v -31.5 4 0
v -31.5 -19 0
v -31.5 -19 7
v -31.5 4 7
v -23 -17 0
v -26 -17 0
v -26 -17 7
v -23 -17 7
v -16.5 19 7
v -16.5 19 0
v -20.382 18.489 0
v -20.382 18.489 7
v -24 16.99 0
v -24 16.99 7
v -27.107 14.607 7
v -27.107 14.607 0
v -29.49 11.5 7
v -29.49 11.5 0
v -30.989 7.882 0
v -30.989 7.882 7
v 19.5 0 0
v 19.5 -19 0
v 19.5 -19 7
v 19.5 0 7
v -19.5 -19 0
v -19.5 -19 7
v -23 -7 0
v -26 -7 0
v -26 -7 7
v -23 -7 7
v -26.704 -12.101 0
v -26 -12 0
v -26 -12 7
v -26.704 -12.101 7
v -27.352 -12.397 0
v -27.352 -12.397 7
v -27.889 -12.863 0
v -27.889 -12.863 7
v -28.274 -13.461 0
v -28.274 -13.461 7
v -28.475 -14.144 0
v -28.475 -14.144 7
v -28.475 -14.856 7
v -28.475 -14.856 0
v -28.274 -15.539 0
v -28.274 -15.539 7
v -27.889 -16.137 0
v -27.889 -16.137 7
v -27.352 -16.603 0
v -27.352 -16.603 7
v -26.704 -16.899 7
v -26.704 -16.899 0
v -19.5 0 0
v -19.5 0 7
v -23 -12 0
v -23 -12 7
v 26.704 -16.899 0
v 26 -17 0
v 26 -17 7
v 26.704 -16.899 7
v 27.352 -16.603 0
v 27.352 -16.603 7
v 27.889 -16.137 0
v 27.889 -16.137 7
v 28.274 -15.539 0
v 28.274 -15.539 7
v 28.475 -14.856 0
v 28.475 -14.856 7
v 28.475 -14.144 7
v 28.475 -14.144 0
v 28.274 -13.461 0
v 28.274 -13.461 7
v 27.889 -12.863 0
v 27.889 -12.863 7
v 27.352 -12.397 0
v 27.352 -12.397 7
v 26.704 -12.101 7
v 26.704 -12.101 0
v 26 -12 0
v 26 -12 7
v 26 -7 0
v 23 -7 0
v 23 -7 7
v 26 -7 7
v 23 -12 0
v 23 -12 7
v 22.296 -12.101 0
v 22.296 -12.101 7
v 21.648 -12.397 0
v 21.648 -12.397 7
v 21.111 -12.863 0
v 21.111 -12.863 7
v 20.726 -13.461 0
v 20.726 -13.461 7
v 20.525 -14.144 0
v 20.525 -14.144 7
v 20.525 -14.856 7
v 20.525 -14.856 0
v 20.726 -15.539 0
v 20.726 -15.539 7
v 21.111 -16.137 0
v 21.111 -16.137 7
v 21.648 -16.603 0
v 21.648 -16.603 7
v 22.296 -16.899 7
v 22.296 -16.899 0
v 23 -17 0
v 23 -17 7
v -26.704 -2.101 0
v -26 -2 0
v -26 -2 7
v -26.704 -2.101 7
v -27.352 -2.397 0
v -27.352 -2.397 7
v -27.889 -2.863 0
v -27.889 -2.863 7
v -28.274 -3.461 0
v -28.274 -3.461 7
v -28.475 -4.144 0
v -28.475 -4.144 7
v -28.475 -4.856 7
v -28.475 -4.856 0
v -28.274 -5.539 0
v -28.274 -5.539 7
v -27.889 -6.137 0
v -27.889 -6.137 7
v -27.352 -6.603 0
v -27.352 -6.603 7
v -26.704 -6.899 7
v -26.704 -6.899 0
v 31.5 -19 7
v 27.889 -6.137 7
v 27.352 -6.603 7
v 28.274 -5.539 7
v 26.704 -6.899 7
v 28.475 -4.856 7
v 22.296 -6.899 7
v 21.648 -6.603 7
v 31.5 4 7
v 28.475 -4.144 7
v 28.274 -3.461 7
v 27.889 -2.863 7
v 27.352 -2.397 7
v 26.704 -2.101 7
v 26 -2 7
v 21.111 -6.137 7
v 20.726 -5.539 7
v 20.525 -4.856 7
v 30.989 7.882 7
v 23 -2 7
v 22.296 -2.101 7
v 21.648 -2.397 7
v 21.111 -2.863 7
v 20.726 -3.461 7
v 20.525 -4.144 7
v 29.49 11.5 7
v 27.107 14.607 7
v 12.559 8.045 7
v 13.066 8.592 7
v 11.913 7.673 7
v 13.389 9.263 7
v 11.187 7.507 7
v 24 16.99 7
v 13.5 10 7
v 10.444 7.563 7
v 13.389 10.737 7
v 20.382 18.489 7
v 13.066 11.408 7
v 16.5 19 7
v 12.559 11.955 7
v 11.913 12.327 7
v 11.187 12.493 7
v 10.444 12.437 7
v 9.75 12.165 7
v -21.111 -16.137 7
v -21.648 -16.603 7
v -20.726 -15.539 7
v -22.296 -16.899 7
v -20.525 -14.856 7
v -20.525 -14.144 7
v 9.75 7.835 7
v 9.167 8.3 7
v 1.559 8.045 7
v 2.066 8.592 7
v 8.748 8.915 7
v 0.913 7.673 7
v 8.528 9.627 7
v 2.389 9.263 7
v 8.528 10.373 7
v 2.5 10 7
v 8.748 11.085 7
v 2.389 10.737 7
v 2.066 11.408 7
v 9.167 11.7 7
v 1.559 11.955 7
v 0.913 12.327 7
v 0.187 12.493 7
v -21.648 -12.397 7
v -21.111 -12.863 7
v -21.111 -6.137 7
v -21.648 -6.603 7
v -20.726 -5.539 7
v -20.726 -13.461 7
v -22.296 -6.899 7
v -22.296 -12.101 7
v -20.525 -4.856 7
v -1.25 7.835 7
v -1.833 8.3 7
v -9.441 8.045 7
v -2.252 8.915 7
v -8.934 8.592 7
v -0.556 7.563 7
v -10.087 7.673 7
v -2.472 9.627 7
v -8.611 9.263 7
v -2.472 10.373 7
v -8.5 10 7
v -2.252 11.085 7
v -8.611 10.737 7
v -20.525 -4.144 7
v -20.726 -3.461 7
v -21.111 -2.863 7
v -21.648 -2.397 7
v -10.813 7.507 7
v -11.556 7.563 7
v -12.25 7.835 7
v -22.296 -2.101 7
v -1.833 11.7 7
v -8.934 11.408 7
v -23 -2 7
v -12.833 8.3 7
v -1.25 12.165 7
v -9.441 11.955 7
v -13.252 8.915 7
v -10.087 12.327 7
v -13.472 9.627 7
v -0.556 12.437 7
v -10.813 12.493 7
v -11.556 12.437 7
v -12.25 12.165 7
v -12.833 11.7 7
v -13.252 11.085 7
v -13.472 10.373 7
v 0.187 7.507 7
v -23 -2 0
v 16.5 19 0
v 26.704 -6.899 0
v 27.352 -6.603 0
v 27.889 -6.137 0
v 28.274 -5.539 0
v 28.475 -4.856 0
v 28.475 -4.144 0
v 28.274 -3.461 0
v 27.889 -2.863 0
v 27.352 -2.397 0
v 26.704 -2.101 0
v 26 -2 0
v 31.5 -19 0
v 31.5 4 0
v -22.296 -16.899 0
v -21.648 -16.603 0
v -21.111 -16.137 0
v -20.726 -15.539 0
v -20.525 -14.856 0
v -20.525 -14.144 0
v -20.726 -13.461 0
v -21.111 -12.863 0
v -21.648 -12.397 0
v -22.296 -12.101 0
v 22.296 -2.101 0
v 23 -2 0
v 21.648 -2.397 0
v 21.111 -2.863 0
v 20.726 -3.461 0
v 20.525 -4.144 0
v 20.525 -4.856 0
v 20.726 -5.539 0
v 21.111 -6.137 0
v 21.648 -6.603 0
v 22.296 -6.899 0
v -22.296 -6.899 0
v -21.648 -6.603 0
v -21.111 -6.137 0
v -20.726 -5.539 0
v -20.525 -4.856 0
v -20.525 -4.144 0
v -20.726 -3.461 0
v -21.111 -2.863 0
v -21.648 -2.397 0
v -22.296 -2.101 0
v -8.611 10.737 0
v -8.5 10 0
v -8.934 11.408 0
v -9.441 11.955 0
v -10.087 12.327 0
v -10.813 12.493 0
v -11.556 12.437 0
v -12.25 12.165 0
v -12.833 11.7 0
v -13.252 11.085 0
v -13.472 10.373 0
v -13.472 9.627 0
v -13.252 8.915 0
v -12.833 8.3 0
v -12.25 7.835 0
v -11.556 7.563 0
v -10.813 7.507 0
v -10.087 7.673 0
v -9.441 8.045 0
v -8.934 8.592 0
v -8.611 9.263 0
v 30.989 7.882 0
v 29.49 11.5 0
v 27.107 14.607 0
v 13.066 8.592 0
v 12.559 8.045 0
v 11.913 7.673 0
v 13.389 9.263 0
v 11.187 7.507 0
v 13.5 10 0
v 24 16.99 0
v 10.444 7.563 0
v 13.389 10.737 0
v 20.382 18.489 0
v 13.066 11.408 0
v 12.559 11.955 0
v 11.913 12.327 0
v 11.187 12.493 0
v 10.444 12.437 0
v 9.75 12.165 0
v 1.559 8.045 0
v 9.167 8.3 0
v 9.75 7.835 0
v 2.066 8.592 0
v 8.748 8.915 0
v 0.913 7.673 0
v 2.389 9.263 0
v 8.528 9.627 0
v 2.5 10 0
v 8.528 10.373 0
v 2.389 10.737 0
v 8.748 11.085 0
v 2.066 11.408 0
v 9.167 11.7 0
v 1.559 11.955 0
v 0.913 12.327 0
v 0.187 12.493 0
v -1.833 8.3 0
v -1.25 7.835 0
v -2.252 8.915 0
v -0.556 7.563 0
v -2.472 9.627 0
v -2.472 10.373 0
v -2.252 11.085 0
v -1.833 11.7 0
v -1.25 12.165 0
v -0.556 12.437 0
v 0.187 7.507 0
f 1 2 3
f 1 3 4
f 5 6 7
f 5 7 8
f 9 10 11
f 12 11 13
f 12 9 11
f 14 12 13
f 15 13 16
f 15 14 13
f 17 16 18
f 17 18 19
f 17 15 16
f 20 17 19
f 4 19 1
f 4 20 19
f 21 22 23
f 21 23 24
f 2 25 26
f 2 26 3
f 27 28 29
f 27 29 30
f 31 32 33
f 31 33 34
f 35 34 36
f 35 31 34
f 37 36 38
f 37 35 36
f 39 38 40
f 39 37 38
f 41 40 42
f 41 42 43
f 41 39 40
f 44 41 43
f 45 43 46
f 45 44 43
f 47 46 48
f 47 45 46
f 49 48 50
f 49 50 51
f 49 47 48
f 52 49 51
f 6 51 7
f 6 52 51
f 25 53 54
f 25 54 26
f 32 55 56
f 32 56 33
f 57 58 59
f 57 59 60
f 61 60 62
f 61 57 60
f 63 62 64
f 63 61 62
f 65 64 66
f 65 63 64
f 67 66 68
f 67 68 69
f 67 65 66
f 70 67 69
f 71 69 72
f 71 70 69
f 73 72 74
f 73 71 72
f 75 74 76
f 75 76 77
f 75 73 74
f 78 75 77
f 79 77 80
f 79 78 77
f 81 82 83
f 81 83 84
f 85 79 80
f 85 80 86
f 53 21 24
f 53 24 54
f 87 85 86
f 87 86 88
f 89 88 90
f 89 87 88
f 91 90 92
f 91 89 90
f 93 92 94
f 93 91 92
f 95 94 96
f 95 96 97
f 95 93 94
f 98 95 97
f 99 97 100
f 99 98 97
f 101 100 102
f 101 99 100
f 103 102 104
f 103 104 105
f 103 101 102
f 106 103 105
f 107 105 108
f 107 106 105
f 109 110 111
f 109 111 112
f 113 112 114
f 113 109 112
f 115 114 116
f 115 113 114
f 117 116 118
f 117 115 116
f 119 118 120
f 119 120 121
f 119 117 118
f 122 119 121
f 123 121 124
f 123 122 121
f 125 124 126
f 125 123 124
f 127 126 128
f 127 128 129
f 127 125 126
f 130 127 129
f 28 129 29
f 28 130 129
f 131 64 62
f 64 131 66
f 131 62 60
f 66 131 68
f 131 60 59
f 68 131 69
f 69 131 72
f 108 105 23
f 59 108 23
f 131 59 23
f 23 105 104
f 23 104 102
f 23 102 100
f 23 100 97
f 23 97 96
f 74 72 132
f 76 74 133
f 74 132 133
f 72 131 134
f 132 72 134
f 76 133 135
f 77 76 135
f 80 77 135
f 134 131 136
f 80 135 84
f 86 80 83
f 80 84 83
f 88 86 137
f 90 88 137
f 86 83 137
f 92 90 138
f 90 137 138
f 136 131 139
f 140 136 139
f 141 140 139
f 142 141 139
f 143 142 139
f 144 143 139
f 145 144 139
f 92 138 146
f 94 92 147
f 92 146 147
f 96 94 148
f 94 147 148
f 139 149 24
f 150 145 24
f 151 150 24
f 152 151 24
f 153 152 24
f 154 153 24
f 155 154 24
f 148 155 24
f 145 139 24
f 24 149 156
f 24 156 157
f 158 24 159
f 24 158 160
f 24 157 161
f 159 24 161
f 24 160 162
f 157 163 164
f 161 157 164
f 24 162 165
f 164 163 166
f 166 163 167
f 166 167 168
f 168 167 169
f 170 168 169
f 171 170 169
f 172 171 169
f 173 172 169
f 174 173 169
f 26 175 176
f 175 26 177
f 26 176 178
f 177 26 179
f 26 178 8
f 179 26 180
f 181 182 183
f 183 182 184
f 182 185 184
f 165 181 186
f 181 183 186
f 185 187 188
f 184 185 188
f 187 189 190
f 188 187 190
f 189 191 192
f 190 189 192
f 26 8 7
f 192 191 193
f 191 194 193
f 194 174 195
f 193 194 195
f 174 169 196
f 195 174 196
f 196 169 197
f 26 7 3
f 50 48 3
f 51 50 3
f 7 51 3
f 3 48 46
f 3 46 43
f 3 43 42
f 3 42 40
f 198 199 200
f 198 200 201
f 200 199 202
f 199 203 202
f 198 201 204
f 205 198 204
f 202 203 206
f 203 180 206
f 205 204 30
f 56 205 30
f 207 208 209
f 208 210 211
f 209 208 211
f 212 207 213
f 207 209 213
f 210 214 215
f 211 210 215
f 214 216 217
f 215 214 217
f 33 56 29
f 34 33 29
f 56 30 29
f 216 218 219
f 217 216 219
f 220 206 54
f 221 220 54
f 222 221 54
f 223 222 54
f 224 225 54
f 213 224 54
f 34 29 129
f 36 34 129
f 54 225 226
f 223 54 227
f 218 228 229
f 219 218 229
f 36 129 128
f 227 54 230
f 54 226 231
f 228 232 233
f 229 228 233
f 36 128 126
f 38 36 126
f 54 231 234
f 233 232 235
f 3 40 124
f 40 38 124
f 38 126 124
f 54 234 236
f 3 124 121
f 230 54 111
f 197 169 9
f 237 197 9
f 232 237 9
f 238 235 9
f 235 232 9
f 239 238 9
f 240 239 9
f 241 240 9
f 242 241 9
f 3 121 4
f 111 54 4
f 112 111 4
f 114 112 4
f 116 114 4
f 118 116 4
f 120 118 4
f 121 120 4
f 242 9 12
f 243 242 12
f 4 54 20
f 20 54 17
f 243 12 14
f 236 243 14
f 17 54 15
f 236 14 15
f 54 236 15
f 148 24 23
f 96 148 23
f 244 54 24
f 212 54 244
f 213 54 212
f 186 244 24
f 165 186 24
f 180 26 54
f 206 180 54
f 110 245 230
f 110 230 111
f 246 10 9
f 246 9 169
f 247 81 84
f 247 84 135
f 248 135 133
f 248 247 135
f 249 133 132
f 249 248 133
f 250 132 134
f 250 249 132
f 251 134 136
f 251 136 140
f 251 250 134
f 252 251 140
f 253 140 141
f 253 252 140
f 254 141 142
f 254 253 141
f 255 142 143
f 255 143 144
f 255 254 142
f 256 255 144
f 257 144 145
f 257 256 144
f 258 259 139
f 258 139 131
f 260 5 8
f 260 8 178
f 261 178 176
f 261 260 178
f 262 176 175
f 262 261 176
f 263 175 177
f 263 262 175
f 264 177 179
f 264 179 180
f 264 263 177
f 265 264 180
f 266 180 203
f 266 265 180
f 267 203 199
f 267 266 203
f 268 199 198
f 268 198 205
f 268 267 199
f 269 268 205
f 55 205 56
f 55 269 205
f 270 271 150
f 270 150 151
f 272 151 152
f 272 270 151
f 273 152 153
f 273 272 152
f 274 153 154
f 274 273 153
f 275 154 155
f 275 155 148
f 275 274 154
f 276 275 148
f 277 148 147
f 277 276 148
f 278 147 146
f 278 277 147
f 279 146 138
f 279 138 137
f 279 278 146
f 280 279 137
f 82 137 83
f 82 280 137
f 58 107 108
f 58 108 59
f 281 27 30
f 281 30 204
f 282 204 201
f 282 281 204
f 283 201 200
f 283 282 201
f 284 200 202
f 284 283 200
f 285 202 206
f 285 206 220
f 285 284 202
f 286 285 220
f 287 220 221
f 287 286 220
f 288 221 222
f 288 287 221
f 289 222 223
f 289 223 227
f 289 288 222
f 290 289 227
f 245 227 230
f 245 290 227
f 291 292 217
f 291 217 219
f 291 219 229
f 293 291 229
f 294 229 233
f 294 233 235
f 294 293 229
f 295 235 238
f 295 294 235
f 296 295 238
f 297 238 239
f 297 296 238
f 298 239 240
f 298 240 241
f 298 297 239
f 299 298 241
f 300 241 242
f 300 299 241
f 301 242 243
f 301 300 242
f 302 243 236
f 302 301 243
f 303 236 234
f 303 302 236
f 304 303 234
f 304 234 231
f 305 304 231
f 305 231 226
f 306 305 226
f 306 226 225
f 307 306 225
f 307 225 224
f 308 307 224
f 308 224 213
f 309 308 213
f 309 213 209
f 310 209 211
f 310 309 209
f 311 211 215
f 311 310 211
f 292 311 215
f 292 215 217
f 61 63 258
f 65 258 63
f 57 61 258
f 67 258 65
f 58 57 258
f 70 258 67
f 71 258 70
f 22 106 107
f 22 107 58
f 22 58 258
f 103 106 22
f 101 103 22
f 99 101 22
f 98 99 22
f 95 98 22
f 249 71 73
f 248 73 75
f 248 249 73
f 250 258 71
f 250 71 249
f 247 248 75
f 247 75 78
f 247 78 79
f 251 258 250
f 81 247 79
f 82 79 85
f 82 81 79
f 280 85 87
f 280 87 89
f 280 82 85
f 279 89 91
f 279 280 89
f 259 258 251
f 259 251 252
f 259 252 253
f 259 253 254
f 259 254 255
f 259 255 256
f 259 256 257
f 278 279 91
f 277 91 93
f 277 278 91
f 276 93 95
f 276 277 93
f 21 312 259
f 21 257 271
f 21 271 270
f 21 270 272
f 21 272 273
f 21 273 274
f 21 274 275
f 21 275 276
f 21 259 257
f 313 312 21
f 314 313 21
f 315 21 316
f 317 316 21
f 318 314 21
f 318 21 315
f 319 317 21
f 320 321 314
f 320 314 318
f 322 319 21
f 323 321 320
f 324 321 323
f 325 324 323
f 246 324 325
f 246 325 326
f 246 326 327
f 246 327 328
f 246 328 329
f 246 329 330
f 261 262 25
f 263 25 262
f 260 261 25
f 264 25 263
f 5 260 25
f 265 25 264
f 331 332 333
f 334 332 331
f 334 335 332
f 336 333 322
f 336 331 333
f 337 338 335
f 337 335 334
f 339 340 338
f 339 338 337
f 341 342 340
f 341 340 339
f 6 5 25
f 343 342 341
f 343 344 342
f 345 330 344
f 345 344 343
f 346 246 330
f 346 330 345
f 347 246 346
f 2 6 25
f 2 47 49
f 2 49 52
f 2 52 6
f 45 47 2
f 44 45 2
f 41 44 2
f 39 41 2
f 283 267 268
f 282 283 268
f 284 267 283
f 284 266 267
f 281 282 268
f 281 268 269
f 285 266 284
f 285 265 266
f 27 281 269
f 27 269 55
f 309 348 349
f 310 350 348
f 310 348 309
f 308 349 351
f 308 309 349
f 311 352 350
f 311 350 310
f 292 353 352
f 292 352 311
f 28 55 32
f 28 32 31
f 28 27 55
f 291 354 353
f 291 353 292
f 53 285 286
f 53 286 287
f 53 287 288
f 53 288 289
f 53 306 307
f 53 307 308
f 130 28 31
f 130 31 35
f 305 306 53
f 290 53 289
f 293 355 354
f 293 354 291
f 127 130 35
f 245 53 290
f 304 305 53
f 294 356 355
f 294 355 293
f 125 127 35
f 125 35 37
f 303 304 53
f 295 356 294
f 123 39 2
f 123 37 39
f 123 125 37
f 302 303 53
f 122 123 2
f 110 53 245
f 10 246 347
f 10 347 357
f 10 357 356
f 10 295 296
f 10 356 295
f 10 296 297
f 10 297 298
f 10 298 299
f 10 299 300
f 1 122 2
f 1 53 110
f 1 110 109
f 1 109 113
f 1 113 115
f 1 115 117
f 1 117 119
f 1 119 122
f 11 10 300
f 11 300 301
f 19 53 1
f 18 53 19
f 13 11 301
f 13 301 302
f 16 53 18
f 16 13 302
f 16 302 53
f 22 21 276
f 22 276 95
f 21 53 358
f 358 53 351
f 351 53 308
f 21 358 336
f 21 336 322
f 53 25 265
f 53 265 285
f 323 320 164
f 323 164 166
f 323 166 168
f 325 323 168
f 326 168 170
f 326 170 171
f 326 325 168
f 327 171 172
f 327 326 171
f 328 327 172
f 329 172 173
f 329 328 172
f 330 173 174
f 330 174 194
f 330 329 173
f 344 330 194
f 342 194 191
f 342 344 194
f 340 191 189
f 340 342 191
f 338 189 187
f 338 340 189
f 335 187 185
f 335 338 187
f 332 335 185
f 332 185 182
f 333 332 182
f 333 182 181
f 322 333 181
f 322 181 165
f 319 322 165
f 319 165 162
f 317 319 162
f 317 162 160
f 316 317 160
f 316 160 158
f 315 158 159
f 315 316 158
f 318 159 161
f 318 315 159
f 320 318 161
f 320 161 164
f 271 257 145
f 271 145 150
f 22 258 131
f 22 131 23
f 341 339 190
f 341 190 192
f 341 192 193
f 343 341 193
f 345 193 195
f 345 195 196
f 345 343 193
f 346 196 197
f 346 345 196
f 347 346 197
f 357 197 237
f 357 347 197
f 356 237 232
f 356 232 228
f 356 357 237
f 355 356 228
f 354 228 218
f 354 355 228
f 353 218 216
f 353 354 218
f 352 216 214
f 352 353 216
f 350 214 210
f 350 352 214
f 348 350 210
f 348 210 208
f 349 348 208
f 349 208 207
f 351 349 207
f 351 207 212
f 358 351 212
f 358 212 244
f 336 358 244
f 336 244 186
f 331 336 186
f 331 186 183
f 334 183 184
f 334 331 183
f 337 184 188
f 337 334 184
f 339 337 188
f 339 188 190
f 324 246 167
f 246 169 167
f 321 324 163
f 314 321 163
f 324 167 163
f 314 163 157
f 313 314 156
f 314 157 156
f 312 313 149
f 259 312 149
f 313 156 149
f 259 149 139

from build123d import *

# Parameters (mm, degrees)
SKETCH_R    = 2.5
PAD_DEPTH   = 7
FILLET_R    = 15
FILLET001_R = 15


with BuildPart() as part:
    # Sketch → Pad (new body)
    with BuildSketch(Plane.XY):
        Polygon((-31.5, 19), (31.5, 19), (31.5, -19), (19.5, -19), (19.5, 0), (-19.5, 0), (-19.5, -19), (-31.5, -19), align=None)
        with Locations((-11, 10)):
            Circle(SKETCH_R, mode=Mode.SUBTRACT)
        with Locations((0, 10)):
            Circle(SKETCH_R, mode=Mode.SUBTRACT)
        with Locations((11, 10)):
            Circle(SKETCH_R, mode=Mode.SUBTRACT)
        with BuildLine():
            ThreePointArc((-26, -2), (-28.5, -4.5), (-26, -7))
            Line((-26, -7), (-23, -7))
            ThreePointArc((-23, -7), (-20.5, -4.5), (-23, -2))
            Line((-23, -2), (-26, -2))
        make_face(mode=Mode.SUBTRACT)
        with BuildLine():
            ThreePointArc((-26, -12), (-28.5, -14.5), (-26, -17))
            Line((-26, -17), (-23, -17))
            ThreePointArc((-23, -17), (-20.5, -14.5), (-23, -12))
            Line((-23, -12), (-26, -12))
        make_face(mode=Mode.SUBTRACT)
        with BuildLine():
            ThreePointArc((23, -2), (20.5, -4.5), (23, -7))
            Line((23, -7), (26, -7))
            ThreePointArc((26, -7), (28.5, -4.5), (26, -2))
            Line((26, -2), (23, -2))
        make_face(mode=Mode.SUBTRACT)
        with BuildLine():
            ThreePointArc((23, -12), (20.5, -14.5), (23, -17))
            Line((23, -17), (26, -17))
            ThreePointArc((26, -17), (28.5, -14.5), (26, -12))
            Line((26, -12), (23, -12))
        make_face(mode=Mode.SUBTRACT)
    extrude(amount=PAD_DEPTH)

    # Fillet
    fillet_edges = [part.edges().sort_by_distance(p)[0] for p in [
        (-31.5, 19, 3.5),
    ]]
    fillet(fillet_edges, radius=FILLET_R)

    # Fillet001
    fillet001_edges = [part.edges().sort_by_distance(p)[0] for p in [
        (31.5, 19, 3.5),
    ]]
    fillet(fillet001_edges, radius=FILLET001_R)


solid = part.part
